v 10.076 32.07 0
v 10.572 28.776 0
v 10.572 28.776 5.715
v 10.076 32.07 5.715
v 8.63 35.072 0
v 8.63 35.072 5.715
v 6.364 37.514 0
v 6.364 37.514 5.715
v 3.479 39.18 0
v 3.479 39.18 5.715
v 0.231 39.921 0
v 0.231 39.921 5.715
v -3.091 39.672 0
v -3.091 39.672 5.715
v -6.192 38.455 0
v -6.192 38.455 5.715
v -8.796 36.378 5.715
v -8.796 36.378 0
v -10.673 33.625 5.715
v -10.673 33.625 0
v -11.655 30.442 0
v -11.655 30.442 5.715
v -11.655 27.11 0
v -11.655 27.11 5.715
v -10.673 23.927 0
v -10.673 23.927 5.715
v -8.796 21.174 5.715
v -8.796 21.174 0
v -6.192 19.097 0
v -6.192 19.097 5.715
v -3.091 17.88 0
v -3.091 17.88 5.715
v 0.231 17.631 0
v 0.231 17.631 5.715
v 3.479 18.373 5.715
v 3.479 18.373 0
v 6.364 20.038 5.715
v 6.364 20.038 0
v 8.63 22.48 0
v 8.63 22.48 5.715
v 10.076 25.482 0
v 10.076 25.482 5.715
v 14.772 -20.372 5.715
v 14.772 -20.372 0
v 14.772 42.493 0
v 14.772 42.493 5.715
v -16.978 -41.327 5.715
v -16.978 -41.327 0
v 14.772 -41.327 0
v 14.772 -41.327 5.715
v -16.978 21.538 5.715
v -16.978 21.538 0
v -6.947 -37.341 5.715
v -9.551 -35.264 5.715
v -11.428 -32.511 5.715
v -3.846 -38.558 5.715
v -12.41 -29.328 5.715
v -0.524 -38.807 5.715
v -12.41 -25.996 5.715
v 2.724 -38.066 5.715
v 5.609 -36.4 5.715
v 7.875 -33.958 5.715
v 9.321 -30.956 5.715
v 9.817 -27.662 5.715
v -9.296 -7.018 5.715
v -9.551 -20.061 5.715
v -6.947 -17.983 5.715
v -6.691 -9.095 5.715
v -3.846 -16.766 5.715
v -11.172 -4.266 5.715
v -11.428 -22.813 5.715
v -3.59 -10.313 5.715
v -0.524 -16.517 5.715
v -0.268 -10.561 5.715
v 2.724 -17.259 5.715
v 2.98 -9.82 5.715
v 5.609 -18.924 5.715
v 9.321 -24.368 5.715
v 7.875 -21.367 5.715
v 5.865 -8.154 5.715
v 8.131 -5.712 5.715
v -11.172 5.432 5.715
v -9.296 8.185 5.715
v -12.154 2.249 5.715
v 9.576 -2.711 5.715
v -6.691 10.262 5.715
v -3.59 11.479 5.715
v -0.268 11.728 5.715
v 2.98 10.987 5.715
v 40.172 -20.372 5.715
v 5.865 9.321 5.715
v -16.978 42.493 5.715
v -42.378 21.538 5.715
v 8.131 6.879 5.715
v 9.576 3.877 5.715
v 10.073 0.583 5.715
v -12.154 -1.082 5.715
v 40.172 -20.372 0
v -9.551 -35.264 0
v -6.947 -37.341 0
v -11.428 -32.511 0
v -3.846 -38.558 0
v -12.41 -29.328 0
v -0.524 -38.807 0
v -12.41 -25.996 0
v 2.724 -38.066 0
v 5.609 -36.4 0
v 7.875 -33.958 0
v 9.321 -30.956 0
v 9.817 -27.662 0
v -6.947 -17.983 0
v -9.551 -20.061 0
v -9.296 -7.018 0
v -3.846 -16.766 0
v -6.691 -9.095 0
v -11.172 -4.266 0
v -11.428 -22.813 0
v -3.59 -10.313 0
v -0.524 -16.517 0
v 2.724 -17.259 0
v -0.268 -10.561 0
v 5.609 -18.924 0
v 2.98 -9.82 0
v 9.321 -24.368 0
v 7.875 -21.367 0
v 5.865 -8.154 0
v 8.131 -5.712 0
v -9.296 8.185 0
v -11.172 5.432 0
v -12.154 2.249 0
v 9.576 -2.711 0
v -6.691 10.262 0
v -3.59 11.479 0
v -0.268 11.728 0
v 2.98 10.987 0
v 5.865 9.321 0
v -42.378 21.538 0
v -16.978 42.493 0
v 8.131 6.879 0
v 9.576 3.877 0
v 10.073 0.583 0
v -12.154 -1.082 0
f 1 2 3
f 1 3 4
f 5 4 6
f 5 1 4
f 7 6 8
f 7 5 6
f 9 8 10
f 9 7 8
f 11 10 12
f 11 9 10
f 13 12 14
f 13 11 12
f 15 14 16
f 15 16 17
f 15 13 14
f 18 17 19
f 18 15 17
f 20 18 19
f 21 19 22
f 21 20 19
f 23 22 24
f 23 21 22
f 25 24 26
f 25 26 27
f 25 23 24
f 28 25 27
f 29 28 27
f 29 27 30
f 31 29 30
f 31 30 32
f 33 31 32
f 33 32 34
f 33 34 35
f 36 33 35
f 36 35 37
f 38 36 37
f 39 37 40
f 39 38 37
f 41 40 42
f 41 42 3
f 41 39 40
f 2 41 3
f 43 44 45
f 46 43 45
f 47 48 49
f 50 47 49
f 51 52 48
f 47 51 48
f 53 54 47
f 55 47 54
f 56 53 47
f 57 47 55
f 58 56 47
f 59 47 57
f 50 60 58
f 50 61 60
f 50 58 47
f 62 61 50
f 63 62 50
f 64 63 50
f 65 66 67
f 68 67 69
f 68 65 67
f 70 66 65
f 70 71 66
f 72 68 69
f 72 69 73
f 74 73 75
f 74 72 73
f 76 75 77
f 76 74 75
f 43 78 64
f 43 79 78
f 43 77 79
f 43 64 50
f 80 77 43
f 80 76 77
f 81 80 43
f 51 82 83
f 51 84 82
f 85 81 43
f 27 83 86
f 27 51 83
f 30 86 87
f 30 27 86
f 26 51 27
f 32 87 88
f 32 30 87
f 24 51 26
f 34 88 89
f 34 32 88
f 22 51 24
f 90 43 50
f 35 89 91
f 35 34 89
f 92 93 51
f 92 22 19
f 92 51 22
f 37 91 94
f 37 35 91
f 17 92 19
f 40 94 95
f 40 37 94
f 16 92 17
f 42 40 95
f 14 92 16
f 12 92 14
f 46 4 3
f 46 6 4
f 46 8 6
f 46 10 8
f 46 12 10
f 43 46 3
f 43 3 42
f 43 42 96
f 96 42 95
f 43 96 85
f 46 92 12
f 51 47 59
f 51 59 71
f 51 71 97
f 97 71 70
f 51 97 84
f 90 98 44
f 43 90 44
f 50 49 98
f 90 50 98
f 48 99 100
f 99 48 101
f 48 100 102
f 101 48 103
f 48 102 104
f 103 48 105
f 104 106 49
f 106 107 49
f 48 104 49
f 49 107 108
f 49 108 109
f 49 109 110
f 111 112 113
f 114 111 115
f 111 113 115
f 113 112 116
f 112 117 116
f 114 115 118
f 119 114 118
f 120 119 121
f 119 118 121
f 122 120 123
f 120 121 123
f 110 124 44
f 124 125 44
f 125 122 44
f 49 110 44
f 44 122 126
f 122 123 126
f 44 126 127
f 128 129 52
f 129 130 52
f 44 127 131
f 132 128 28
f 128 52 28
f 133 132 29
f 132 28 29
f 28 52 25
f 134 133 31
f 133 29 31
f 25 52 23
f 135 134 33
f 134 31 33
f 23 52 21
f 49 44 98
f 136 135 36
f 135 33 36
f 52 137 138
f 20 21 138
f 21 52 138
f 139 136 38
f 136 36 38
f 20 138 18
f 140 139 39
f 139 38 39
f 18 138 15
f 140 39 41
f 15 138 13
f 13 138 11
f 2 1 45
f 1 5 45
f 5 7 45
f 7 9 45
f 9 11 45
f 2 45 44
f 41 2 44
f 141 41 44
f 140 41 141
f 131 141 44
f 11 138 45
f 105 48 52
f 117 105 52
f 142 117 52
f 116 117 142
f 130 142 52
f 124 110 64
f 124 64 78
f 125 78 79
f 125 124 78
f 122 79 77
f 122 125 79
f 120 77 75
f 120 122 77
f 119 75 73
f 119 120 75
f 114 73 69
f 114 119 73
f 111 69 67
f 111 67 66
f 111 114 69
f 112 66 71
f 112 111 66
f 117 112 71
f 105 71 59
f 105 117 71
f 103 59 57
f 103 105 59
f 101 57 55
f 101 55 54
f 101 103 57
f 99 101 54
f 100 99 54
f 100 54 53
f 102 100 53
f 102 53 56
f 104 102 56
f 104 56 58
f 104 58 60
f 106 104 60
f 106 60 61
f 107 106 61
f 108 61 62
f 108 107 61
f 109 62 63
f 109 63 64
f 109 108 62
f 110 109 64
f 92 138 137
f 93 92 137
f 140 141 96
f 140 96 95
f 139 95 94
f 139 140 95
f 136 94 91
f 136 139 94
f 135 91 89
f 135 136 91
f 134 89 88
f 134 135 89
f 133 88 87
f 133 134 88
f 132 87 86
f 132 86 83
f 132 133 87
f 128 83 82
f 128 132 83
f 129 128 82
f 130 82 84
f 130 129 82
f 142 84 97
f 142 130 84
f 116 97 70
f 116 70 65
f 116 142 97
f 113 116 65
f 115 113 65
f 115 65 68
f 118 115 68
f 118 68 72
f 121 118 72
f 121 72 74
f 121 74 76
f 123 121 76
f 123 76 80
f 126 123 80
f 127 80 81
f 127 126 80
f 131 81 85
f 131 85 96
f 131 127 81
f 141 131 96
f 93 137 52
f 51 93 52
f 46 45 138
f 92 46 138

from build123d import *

# Parameters (mm, degrees)
F0_R     = 11.176
F1_DEPTH = 5.715


with BuildPart() as f1:
    # F0 (on Top) → F1 (new body)
    with BuildSketch(Plane.XY):
        with BuildLine():
            Line((14.771742, -20.371711), (14.771742, 0.583289))
            ThreePointArc((14.771742, 0.583289), (-1.103258, -15.291711), (-16.978258, 0.583289))
            Line((-16.978258, 0.583289), (-16.978258, -41.326711))
            Line((-16.978258, -41.326711), (14.771742, -41.326711))
            Line((14.771742, -41.326711), (14.771742, -20.371711))
        make_face()
        with Locations((-1.35877, -27.66218)):
            Circle(F0_R, mode=Mode.SUBTRACT)
        with BuildLine():
            ThreePointArc((-16.978258, 0.583289), (-1.103258, -15.291711), (14.771742, 0.583289))
            ThreePointArc((14.771742, 0.583289), (-1.103258, 16.458289), (-16.978258, 0.583289))
        make_face()
        with Locations((-1.103258, 0.583289)):
            Circle(F0_R, mode=Mode.SUBTRACT)
        with BuildLine():
            ThreePointArc((-16.978258, 0.583289), (-1.103258, 16.458289), (14.771742, 0.583289))
            Line((14.771742, 0.583289), (14.771742, 42.493289))
            Line((14.771742, 42.493289), (-16.978258, 42.493289))
            Line((-16.978258, 42.493289), (-16.978258, 21.538289))
            Line((-16.978258, 21.538289), (-16.978258, 0.583289))
        make_face()
        with Locations((-0.603735, 28.776065)):
            Circle(F0_R, mode=Mode.SUBTRACT)
        Polygon((40.171742, -20.371711), (14.771742, -20.371711), (14.771742, -41.326711), align=None)
        Polygon((-42.378258, 21.538289), (-16.978258, 21.538289), (-16.978258, 42.493289), align=None)
    extrude(amount=F1_DEPTH)


solid = f1.part
